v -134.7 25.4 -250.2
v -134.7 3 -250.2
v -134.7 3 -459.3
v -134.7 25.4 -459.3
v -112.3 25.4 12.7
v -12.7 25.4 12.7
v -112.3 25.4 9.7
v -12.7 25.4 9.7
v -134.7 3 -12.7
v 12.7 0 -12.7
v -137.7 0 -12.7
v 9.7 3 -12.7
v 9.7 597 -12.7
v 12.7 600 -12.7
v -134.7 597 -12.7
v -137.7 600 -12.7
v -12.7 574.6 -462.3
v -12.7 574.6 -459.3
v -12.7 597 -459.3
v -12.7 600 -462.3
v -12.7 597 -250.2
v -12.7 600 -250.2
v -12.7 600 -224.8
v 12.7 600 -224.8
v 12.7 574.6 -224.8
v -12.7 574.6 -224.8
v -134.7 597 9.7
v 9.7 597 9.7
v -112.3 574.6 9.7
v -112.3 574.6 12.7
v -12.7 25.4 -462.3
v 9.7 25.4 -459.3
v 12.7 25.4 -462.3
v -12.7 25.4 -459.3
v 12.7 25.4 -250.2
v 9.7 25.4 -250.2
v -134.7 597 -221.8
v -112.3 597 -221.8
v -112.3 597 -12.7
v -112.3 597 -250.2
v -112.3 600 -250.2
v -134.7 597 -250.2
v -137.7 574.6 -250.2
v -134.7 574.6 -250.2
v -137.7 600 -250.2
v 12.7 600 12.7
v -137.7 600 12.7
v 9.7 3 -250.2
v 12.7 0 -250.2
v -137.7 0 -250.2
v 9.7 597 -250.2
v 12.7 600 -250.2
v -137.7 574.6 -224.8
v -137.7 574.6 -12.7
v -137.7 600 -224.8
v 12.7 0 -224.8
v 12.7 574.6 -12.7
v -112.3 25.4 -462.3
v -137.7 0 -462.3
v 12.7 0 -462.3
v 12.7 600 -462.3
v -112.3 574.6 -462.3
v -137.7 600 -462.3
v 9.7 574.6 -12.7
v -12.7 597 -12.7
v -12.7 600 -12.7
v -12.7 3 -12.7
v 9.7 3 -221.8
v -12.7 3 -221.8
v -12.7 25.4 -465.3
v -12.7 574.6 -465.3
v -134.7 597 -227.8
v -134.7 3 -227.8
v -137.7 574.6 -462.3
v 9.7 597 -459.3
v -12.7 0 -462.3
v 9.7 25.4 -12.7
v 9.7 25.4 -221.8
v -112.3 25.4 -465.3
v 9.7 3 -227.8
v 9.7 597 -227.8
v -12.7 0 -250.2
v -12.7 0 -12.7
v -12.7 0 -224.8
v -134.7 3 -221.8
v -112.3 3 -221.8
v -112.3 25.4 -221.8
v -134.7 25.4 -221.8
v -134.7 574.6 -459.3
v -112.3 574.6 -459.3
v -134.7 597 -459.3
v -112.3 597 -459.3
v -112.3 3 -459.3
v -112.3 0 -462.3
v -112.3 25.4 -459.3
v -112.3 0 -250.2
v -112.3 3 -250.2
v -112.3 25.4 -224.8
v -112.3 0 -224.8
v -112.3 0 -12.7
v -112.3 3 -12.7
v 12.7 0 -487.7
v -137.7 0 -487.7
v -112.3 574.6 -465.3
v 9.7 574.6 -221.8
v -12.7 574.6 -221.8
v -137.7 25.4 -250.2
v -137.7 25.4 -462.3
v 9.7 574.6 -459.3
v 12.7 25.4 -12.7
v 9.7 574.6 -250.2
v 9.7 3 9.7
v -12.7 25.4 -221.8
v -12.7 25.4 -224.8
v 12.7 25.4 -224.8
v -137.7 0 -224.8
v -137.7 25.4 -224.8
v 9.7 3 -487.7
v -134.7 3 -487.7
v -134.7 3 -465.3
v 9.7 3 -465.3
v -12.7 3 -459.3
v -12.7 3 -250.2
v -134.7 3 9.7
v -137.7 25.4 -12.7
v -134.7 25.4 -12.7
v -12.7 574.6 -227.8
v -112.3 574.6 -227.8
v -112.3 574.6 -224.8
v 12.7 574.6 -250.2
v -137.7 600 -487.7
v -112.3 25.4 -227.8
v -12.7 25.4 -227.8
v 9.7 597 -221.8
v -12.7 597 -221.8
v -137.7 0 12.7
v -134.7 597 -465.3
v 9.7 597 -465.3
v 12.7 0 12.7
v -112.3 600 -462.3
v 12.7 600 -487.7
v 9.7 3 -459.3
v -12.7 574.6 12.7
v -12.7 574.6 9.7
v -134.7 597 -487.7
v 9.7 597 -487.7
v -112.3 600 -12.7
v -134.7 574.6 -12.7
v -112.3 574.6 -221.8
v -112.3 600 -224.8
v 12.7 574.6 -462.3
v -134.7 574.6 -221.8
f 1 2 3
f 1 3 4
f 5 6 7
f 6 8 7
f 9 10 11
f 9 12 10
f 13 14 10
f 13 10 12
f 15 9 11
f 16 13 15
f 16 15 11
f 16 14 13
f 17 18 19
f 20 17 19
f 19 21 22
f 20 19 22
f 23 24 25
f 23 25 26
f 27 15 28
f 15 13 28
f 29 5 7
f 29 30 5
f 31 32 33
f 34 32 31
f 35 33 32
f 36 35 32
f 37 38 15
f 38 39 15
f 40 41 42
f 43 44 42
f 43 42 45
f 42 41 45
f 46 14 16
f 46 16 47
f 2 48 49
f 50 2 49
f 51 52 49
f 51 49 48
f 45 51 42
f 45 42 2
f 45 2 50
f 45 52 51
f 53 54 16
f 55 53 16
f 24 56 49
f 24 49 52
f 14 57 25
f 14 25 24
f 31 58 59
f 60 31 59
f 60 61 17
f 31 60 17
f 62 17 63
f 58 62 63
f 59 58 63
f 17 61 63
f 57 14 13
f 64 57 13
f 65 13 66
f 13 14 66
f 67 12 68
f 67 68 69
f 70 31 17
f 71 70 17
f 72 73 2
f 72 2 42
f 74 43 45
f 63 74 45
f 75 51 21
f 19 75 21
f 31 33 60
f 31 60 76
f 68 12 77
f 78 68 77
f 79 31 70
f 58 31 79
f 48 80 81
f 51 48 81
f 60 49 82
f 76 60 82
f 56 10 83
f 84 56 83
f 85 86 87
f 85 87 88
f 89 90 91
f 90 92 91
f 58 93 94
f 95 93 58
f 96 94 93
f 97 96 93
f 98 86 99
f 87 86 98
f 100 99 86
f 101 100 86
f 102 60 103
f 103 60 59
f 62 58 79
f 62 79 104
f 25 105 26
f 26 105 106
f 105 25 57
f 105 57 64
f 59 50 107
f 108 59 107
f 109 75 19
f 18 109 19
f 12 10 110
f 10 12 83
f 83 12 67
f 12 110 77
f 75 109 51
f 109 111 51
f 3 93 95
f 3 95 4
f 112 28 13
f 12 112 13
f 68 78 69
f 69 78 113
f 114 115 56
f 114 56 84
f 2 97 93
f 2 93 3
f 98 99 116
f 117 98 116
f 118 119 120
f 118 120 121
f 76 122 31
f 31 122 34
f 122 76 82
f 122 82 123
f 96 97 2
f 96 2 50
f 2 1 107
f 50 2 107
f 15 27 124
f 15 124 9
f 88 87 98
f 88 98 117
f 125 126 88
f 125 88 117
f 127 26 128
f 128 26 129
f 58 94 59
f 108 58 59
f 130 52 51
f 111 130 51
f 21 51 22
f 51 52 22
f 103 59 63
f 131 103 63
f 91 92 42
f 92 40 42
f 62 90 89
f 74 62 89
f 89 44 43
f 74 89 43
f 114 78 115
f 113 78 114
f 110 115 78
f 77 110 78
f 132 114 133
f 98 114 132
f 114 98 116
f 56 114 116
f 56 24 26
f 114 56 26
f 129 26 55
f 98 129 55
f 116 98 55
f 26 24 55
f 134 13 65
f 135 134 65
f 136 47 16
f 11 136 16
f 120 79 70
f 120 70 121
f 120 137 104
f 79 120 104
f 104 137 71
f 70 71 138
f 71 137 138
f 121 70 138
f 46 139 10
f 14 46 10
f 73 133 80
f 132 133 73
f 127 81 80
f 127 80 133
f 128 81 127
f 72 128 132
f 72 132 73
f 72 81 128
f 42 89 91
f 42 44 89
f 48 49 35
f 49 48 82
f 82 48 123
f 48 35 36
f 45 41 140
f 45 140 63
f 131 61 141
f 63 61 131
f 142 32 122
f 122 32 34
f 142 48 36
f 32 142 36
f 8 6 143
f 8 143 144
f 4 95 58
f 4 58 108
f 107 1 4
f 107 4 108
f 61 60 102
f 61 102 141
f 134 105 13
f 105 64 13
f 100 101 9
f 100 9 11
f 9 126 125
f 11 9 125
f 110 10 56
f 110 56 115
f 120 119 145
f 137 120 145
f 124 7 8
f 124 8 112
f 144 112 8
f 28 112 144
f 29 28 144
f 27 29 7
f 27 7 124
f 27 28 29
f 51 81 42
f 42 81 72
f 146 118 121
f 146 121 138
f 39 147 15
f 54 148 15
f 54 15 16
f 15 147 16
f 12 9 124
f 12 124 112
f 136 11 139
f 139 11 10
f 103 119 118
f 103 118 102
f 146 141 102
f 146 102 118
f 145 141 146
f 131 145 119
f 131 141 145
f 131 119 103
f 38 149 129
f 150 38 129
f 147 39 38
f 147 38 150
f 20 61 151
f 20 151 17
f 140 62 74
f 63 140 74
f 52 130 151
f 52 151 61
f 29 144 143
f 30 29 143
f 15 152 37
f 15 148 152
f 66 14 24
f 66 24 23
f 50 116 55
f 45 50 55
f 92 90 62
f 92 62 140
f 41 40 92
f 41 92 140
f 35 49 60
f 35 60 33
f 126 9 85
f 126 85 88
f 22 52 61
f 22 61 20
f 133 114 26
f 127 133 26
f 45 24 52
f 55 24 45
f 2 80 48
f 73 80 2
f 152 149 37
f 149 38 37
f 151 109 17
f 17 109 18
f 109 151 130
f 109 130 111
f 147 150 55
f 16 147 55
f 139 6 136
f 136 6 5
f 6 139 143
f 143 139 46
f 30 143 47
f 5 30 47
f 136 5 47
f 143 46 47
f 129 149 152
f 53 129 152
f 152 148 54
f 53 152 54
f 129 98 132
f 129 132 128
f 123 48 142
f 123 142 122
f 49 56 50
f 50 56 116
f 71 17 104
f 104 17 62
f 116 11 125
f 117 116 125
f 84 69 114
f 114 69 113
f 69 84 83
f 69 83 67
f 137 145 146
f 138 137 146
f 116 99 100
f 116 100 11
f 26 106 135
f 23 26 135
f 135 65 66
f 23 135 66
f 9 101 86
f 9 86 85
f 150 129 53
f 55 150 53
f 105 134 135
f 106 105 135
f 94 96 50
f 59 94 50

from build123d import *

# Parameters (mm, degrees)
SKETCH1_W             = 25.4
SKETCH1_H             = 25.4
BOSS_EXTRUDE1_DEPTH   = 600
SKETCH2_W             = 25.4
SKETCH2_H             = 25.4
BOSS_EXTRUDE2_DEPTH   = 125
SKETCH3_W             = 25.4
SKETCH3_H             = 25.4
BOSS_EXTRUDE3_DEPTH   = 574.6
SKETCH4_W             = 150.4
SKETCH4_H             = 25.4
BOSS_EXTRUDE4_DEPTH   = 25.4
SKETCH5_W             = 25.4
SKETCH5_H             = 25.4
BOSS_EXTRUDE5_DEPTH   = 212.1
BOSS_EXTRUDE5_2_DEPTH = 212.1
BOSS_EXTRUDE5_3_DEPTH = 212.1
BOSS_EXTRUDE5_4_DEPTH = 212.1
SKETCH6_W             = 150.4
SKETCH6_H             = 600
SKETCH6_W_2           = 99.6
SKETCH6_H_2           = 549.2
BOSS_EXTRUDE6_DEPTH   = 25.4
SKETCH7_W             = 25.4
SKETCH7_H             = 25.4
BOSS_EXTRUDE7_DEPTH   = 212.1
BOSS_EXTRUDE7_2_DEPTH = 212.1
BOSS_EXTRUDE7_3_DEPTH = 212.1
BOSS_EXTRUDE7_4_DEPTH = 212.1
SKETCH9_W             = 150.4
SKETCH9_H             = 600
SKETCH9_W_2           = 99.6
SKETCH9_H_2           = 549.2
BOSS_EXTRUDE8_DEPTH   = 25.4
SHELL2_T              = -3
SHELL3_T              = -3
SHELL4_T              = -3
SHELL5_T              = -3
SHELL6_T              = -3
SHELL7_T              = -3
SHELL8_T              = -3
SHELL9_T              = -3
SHELL10_T             = -3
SHELL11_T             = -3
SHELL12_T             = -3


with BuildPart() as part:
    # Sketch1 → Boss-Extrude1 (new body)
    with BuildSketch(Plane(origin=(0, 0, 0), x_dir=(1, 0, 0), z_dir=(0, 1, 0))):
        Rectangle(SKETCH1_W, SKETCH1_H)
    extrude(amount=BOSS_EXTRUDE1_DEPTH)

    # Sketch2 → Boss-Extrude2 (add)
    with BuildSketch(Plane.ZY.offset(12.7)):
        with Locations((0, 587.3)):
            Rectangle(SKETCH2_W, SKETCH2_H)
    extrude(amount=BOSS_EXTRUDE2_DEPTH)

    # Sketch3 → Boss-Extrude3 (add)
    with BuildSketch(Plane(origin=(0, 574.6, 0), x_dir=(-1, 0, 0), z_dir=(0, -1, 0))):
        with Locations((125, 0)):
            Rectangle(SKETCH3_W, SKETCH3_H)
    extrude(amount=BOSS_EXTRUDE3_DEPTH)

    # Sketch4 → Boss-Extrude4 (add)
    with BuildSketch(Plane(origin=(0, 0, -12.7), x_dir=(-1, 0, 0), z_dir=(0, 0, -1))):
        with Locations((62.5, 12.7)):
            Rectangle(SKETCH4_W, SKETCH4_H)
    extrude(amount=-BOSS_EXTRUDE4_DEPTH)

    # Shell2
    shell2_openings = [part.faces().sort_by_distance(p)[0] for p in [
        (-112.3, 300, 0),
        (-62.5, 574.6, 0),
        (-62.5, 25.4, 0),
        (-12.7, 300, 0),
        (-62.5, 6.185629798, -12.7),
    ]]
    offset(amount=SHELL2_T, openings=shell2_openings, kind=Kind.INTERSECTION)


with BuildPart() as body_2:
    # Sketch5 → Boss-Extrude5 (new body)
    with BuildSketch(Plane(origin=(0, 0, -12.7), x_dir=(-1, 0, 0), z_dir=(0, 0, -1))):
        with Locations((0, 587.3)):
            Rectangle(SKETCH5_W, SKETCH5_H)
    extrude(amount=BOSS_EXTRUDE5_DEPTH)

    # Shell3
    shell3_openings = [body_2.faces().sort_by_distance(p)[0] for p in [
        (0, 587.3, -12.7),
        (0, 574.6, -118.75),
        (-12.7, 587.3, -118.75),
    ]]
    offset(amount=SHELL3_T, openings=shell3_openings, kind=Kind.INTERSECTION)


with BuildPart() as body_3:
    # Sketch5 → Boss-Extrude5 2 (new body)
    with BuildSketch(Plane(origin=(0, 0, -12.7), x_dir=(-1, 0, 0), z_dir=(0, 0, -1))):
        with Locations((125, 587.3)):
            Rectangle(SKETCH5_W, SKETCH5_H)
    extrude(amount=BOSS_EXTRUDE5_2_DEPTH)

    # Shell4
    shell4_openings = [body_3.faces().sort_by_distance(p)[0] for p in [
        (-125, 587.3, -12.7),
        (-112.3, 587.3, -118.75),
        (-125, 574.6, -118.75),
    ]]
    offset(amount=SHELL4_T, openings=shell4_openings, kind=Kind.INTERSECTION)


with BuildPart() as body_4:
    # Sketch5 → Boss-Extrude5 3 (new body)
    with BuildSketch(Plane(origin=(0, 0, -12.7), x_dir=(-1, 0, 0), z_dir=(0, 0, -1))):
        with Locations((0, 12.7)):
            Rectangle(SKETCH5_W, SKETCH5_H)
    extrude(amount=BOSS_EXTRUDE5_3_DEPTH)

    # Shell5
    shell5_openings = [body_4.faces().sort_by_distance(p)[0] for p in [
        (0, 12.7, -12.7),
        (-12.7, 12.7, -118.75),
        (0, 25.4, -118.75),
    ]]
    offset(amount=SHELL5_T, openings=shell5_openings, kind=Kind.INTERSECTION)


with BuildPart() as body_5:
    # Sketch5 → Boss-Extrude5 4 (new body)
    with BuildSketch(Plane(origin=(0, 0, -12.7), x_dir=(-1, 0, 0), z_dir=(0, 0, -1))):
        with Locations((125, 12.7)):
            Rectangle(SKETCH5_W, SKETCH5_H)
    extrude(amount=BOSS_EXTRUDE5_4_DEPTH)

    # Shell6
    shell6_openings = [body_5.faces().sort_by_distance(p)[0] for p in [
        (-125, 12.7, -12.7),
        (-112.3, 12.7, -118.75),
        (-125, 25.4, -118.75),
    ]]
    offset(amount=SHELL6_T, openings=shell6_openings, kind=Kind.INTERSECTION)


with BuildPart() as body_6:
    # Sketch6 → Boss-Extrude6 (new body)
    with BuildSketch(Plane(origin=(0, 0, -224.8), x_dir=(-1, 0, 0), z_dir=(0, 0, -1))):
        with Locations((62.5, 300)):
            Rectangle(SKETCH6_W, SKETCH6_H)
        with Locations((62.5, 300)):
            Rectangle(SKETCH6_W_2, SKETCH6_H_2, mode=Mode.SUBTRACT)
    extrude(amount=BOSS_EXTRUDE6_DEPTH)

    # Shell7
    shell7_openings = [body_6.faces().sort_by_distance(p)[0] for p in [
        (-62.5, 6.185629798, -250.2),
        (-112.3, 300, -237.5),
        (-62.5, 25.4, -237.5),
        (-12.7, 300, -237.5),
        (-62.5, 574.6, -237.5),
    ]]
    offset(amount=SHELL7_T, openings=shell7_openings, kind=Kind.INTERSECTION)


with BuildPart() as body_7:
    # Sketch7 → Boss-Extrude7 (new body)
    with BuildSketch(Plane(origin=(0, 0, -250.2), x_dir=(-1, 0, 0), z_dir=(0, 0, -1))):
        with Locations((0, 587.3)):
            Rectangle(SKETCH7_W, SKETCH7_H)
    extrude(amount=BOSS_EXTRUDE7_DEPTH)

    # Shell9
    shell9_openings = [body_7.faces().sort_by_distance(p)[0] for p in [
        (0, 587.3, -250.2),
        (-12.7, 587.3, -356.25),
        (0, 574.6, -356.25),
    ]]
    offset(amount=SHELL9_T, openings=shell9_openings, kind=Kind.INTERSECTION)


with BuildPart() as body_8:
    # Sketch7 → Boss-Extrude7 2 (new body)
    with BuildSketch(Plane(origin=(0, 0, -250.2), x_dir=(-1, 0, 0), z_dir=(0, 0, -1))):
        with Locations((125, 587.3)):
            Rectangle(SKETCH7_W, SKETCH7_H)
    extrude(amount=BOSS_EXTRUDE7_2_DEPTH)

    # Shell8
    shell8_openings = [body_8.faces().sort_by_distance(p)[0] for p in [
        (-125, 574.6, -356.25),
        (-112.3, 587.3, -356.25),
        (-125, 587.3, -250.2),
    ]]
    offset(amount=SHELL8_T, openings=shell8_openings, kind=Kind.INTERSECTION)


with BuildPart() as body_9:
    # Sketch7 → Boss-Extrude7 3 (new body)
    with BuildSketch(Plane(origin=(0, 0, -250.2), x_dir=(-1, 0, 0), z_dir=(0, 0, -1))):
        with Locations((0, 12.7)):
            Rectangle(SKETCH7_W, SKETCH7_H)
    extrude(amount=BOSS_EXTRUDE7_3_DEPTH)

    # Shell10
    shell10_openings = [body_9.faces().sort_by_distance(p)[0] for p in [
        (0, 25.4, -356.25),
        (-12.7, 12.7, -356.25),
        (0, 12.7, -250.2),
    ]]
    offset(amount=SHELL10_T, openings=shell10_openings, kind=Kind.INTERSECTION)


with BuildPart() as body_10:
    # Sketch7 → Boss-Extrude7 4 (new body)
    with BuildSketch(Plane(origin=(0, 0, -250.2), x_dir=(-1, 0, 0), z_dir=(0, 0, -1))):
        with Locations((125, 12.7)):
            Rectangle(SKETCH7_W, SKETCH7_H)
    extrude(amount=BOSS_EXTRUDE7_4_DEPTH)

    # Shell11
    shell11_openings = [body_10.faces().sort_by_distance(p)[0] for p in [
        (-125, 12.7, -250.2),
        (-125, 25.4, -356.25),
        (-112.3, 12.7, -356.25),
    ]]
    offset(amount=SHELL11_T, openings=shell11_openings, kind=Kind.INTERSECTION)


with BuildPart() as body_11:
    # Sketch9 → Boss-Extrude8 (new body)
    with BuildSketch(Plane(origin=(0, 0, -462.3), x_dir=(-1, 0, 0), z_dir=(0, 0, -1))):
        with Locations((62.5, 300)):
            Rectangle(SKETCH9_W, SKETCH9_H)
        with Locations((62.5, 300)):
            Rectangle(SKETCH9_W_2, SKETCH9_H_2, mode=Mode.SUBTRACT)
    extrude(amount=BOSS_EXTRUDE8_DEPTH)

    # Shell12
    shell12_openings = [body_11.faces().sort_by_distance(p)[0] for p in [
        (-62.5, 574.6, -475),
        (-112.3, 300, -475),
        (-62.5, 25.4, -475),
        (-62.5, 6.185629798, -487.7),
        (-12.7, 300, -475),
    ]]
    offset(amount=SHELL12_T, openings=shell12_openings, kind=Kind.INTERSECTION)


solid = Compound([part.part, body_2.part, body_3.part, body_4.part, body_5.part, body_6.part, body_7.part, body_8.part, body_9.part, body_10.part, body_11.part])
